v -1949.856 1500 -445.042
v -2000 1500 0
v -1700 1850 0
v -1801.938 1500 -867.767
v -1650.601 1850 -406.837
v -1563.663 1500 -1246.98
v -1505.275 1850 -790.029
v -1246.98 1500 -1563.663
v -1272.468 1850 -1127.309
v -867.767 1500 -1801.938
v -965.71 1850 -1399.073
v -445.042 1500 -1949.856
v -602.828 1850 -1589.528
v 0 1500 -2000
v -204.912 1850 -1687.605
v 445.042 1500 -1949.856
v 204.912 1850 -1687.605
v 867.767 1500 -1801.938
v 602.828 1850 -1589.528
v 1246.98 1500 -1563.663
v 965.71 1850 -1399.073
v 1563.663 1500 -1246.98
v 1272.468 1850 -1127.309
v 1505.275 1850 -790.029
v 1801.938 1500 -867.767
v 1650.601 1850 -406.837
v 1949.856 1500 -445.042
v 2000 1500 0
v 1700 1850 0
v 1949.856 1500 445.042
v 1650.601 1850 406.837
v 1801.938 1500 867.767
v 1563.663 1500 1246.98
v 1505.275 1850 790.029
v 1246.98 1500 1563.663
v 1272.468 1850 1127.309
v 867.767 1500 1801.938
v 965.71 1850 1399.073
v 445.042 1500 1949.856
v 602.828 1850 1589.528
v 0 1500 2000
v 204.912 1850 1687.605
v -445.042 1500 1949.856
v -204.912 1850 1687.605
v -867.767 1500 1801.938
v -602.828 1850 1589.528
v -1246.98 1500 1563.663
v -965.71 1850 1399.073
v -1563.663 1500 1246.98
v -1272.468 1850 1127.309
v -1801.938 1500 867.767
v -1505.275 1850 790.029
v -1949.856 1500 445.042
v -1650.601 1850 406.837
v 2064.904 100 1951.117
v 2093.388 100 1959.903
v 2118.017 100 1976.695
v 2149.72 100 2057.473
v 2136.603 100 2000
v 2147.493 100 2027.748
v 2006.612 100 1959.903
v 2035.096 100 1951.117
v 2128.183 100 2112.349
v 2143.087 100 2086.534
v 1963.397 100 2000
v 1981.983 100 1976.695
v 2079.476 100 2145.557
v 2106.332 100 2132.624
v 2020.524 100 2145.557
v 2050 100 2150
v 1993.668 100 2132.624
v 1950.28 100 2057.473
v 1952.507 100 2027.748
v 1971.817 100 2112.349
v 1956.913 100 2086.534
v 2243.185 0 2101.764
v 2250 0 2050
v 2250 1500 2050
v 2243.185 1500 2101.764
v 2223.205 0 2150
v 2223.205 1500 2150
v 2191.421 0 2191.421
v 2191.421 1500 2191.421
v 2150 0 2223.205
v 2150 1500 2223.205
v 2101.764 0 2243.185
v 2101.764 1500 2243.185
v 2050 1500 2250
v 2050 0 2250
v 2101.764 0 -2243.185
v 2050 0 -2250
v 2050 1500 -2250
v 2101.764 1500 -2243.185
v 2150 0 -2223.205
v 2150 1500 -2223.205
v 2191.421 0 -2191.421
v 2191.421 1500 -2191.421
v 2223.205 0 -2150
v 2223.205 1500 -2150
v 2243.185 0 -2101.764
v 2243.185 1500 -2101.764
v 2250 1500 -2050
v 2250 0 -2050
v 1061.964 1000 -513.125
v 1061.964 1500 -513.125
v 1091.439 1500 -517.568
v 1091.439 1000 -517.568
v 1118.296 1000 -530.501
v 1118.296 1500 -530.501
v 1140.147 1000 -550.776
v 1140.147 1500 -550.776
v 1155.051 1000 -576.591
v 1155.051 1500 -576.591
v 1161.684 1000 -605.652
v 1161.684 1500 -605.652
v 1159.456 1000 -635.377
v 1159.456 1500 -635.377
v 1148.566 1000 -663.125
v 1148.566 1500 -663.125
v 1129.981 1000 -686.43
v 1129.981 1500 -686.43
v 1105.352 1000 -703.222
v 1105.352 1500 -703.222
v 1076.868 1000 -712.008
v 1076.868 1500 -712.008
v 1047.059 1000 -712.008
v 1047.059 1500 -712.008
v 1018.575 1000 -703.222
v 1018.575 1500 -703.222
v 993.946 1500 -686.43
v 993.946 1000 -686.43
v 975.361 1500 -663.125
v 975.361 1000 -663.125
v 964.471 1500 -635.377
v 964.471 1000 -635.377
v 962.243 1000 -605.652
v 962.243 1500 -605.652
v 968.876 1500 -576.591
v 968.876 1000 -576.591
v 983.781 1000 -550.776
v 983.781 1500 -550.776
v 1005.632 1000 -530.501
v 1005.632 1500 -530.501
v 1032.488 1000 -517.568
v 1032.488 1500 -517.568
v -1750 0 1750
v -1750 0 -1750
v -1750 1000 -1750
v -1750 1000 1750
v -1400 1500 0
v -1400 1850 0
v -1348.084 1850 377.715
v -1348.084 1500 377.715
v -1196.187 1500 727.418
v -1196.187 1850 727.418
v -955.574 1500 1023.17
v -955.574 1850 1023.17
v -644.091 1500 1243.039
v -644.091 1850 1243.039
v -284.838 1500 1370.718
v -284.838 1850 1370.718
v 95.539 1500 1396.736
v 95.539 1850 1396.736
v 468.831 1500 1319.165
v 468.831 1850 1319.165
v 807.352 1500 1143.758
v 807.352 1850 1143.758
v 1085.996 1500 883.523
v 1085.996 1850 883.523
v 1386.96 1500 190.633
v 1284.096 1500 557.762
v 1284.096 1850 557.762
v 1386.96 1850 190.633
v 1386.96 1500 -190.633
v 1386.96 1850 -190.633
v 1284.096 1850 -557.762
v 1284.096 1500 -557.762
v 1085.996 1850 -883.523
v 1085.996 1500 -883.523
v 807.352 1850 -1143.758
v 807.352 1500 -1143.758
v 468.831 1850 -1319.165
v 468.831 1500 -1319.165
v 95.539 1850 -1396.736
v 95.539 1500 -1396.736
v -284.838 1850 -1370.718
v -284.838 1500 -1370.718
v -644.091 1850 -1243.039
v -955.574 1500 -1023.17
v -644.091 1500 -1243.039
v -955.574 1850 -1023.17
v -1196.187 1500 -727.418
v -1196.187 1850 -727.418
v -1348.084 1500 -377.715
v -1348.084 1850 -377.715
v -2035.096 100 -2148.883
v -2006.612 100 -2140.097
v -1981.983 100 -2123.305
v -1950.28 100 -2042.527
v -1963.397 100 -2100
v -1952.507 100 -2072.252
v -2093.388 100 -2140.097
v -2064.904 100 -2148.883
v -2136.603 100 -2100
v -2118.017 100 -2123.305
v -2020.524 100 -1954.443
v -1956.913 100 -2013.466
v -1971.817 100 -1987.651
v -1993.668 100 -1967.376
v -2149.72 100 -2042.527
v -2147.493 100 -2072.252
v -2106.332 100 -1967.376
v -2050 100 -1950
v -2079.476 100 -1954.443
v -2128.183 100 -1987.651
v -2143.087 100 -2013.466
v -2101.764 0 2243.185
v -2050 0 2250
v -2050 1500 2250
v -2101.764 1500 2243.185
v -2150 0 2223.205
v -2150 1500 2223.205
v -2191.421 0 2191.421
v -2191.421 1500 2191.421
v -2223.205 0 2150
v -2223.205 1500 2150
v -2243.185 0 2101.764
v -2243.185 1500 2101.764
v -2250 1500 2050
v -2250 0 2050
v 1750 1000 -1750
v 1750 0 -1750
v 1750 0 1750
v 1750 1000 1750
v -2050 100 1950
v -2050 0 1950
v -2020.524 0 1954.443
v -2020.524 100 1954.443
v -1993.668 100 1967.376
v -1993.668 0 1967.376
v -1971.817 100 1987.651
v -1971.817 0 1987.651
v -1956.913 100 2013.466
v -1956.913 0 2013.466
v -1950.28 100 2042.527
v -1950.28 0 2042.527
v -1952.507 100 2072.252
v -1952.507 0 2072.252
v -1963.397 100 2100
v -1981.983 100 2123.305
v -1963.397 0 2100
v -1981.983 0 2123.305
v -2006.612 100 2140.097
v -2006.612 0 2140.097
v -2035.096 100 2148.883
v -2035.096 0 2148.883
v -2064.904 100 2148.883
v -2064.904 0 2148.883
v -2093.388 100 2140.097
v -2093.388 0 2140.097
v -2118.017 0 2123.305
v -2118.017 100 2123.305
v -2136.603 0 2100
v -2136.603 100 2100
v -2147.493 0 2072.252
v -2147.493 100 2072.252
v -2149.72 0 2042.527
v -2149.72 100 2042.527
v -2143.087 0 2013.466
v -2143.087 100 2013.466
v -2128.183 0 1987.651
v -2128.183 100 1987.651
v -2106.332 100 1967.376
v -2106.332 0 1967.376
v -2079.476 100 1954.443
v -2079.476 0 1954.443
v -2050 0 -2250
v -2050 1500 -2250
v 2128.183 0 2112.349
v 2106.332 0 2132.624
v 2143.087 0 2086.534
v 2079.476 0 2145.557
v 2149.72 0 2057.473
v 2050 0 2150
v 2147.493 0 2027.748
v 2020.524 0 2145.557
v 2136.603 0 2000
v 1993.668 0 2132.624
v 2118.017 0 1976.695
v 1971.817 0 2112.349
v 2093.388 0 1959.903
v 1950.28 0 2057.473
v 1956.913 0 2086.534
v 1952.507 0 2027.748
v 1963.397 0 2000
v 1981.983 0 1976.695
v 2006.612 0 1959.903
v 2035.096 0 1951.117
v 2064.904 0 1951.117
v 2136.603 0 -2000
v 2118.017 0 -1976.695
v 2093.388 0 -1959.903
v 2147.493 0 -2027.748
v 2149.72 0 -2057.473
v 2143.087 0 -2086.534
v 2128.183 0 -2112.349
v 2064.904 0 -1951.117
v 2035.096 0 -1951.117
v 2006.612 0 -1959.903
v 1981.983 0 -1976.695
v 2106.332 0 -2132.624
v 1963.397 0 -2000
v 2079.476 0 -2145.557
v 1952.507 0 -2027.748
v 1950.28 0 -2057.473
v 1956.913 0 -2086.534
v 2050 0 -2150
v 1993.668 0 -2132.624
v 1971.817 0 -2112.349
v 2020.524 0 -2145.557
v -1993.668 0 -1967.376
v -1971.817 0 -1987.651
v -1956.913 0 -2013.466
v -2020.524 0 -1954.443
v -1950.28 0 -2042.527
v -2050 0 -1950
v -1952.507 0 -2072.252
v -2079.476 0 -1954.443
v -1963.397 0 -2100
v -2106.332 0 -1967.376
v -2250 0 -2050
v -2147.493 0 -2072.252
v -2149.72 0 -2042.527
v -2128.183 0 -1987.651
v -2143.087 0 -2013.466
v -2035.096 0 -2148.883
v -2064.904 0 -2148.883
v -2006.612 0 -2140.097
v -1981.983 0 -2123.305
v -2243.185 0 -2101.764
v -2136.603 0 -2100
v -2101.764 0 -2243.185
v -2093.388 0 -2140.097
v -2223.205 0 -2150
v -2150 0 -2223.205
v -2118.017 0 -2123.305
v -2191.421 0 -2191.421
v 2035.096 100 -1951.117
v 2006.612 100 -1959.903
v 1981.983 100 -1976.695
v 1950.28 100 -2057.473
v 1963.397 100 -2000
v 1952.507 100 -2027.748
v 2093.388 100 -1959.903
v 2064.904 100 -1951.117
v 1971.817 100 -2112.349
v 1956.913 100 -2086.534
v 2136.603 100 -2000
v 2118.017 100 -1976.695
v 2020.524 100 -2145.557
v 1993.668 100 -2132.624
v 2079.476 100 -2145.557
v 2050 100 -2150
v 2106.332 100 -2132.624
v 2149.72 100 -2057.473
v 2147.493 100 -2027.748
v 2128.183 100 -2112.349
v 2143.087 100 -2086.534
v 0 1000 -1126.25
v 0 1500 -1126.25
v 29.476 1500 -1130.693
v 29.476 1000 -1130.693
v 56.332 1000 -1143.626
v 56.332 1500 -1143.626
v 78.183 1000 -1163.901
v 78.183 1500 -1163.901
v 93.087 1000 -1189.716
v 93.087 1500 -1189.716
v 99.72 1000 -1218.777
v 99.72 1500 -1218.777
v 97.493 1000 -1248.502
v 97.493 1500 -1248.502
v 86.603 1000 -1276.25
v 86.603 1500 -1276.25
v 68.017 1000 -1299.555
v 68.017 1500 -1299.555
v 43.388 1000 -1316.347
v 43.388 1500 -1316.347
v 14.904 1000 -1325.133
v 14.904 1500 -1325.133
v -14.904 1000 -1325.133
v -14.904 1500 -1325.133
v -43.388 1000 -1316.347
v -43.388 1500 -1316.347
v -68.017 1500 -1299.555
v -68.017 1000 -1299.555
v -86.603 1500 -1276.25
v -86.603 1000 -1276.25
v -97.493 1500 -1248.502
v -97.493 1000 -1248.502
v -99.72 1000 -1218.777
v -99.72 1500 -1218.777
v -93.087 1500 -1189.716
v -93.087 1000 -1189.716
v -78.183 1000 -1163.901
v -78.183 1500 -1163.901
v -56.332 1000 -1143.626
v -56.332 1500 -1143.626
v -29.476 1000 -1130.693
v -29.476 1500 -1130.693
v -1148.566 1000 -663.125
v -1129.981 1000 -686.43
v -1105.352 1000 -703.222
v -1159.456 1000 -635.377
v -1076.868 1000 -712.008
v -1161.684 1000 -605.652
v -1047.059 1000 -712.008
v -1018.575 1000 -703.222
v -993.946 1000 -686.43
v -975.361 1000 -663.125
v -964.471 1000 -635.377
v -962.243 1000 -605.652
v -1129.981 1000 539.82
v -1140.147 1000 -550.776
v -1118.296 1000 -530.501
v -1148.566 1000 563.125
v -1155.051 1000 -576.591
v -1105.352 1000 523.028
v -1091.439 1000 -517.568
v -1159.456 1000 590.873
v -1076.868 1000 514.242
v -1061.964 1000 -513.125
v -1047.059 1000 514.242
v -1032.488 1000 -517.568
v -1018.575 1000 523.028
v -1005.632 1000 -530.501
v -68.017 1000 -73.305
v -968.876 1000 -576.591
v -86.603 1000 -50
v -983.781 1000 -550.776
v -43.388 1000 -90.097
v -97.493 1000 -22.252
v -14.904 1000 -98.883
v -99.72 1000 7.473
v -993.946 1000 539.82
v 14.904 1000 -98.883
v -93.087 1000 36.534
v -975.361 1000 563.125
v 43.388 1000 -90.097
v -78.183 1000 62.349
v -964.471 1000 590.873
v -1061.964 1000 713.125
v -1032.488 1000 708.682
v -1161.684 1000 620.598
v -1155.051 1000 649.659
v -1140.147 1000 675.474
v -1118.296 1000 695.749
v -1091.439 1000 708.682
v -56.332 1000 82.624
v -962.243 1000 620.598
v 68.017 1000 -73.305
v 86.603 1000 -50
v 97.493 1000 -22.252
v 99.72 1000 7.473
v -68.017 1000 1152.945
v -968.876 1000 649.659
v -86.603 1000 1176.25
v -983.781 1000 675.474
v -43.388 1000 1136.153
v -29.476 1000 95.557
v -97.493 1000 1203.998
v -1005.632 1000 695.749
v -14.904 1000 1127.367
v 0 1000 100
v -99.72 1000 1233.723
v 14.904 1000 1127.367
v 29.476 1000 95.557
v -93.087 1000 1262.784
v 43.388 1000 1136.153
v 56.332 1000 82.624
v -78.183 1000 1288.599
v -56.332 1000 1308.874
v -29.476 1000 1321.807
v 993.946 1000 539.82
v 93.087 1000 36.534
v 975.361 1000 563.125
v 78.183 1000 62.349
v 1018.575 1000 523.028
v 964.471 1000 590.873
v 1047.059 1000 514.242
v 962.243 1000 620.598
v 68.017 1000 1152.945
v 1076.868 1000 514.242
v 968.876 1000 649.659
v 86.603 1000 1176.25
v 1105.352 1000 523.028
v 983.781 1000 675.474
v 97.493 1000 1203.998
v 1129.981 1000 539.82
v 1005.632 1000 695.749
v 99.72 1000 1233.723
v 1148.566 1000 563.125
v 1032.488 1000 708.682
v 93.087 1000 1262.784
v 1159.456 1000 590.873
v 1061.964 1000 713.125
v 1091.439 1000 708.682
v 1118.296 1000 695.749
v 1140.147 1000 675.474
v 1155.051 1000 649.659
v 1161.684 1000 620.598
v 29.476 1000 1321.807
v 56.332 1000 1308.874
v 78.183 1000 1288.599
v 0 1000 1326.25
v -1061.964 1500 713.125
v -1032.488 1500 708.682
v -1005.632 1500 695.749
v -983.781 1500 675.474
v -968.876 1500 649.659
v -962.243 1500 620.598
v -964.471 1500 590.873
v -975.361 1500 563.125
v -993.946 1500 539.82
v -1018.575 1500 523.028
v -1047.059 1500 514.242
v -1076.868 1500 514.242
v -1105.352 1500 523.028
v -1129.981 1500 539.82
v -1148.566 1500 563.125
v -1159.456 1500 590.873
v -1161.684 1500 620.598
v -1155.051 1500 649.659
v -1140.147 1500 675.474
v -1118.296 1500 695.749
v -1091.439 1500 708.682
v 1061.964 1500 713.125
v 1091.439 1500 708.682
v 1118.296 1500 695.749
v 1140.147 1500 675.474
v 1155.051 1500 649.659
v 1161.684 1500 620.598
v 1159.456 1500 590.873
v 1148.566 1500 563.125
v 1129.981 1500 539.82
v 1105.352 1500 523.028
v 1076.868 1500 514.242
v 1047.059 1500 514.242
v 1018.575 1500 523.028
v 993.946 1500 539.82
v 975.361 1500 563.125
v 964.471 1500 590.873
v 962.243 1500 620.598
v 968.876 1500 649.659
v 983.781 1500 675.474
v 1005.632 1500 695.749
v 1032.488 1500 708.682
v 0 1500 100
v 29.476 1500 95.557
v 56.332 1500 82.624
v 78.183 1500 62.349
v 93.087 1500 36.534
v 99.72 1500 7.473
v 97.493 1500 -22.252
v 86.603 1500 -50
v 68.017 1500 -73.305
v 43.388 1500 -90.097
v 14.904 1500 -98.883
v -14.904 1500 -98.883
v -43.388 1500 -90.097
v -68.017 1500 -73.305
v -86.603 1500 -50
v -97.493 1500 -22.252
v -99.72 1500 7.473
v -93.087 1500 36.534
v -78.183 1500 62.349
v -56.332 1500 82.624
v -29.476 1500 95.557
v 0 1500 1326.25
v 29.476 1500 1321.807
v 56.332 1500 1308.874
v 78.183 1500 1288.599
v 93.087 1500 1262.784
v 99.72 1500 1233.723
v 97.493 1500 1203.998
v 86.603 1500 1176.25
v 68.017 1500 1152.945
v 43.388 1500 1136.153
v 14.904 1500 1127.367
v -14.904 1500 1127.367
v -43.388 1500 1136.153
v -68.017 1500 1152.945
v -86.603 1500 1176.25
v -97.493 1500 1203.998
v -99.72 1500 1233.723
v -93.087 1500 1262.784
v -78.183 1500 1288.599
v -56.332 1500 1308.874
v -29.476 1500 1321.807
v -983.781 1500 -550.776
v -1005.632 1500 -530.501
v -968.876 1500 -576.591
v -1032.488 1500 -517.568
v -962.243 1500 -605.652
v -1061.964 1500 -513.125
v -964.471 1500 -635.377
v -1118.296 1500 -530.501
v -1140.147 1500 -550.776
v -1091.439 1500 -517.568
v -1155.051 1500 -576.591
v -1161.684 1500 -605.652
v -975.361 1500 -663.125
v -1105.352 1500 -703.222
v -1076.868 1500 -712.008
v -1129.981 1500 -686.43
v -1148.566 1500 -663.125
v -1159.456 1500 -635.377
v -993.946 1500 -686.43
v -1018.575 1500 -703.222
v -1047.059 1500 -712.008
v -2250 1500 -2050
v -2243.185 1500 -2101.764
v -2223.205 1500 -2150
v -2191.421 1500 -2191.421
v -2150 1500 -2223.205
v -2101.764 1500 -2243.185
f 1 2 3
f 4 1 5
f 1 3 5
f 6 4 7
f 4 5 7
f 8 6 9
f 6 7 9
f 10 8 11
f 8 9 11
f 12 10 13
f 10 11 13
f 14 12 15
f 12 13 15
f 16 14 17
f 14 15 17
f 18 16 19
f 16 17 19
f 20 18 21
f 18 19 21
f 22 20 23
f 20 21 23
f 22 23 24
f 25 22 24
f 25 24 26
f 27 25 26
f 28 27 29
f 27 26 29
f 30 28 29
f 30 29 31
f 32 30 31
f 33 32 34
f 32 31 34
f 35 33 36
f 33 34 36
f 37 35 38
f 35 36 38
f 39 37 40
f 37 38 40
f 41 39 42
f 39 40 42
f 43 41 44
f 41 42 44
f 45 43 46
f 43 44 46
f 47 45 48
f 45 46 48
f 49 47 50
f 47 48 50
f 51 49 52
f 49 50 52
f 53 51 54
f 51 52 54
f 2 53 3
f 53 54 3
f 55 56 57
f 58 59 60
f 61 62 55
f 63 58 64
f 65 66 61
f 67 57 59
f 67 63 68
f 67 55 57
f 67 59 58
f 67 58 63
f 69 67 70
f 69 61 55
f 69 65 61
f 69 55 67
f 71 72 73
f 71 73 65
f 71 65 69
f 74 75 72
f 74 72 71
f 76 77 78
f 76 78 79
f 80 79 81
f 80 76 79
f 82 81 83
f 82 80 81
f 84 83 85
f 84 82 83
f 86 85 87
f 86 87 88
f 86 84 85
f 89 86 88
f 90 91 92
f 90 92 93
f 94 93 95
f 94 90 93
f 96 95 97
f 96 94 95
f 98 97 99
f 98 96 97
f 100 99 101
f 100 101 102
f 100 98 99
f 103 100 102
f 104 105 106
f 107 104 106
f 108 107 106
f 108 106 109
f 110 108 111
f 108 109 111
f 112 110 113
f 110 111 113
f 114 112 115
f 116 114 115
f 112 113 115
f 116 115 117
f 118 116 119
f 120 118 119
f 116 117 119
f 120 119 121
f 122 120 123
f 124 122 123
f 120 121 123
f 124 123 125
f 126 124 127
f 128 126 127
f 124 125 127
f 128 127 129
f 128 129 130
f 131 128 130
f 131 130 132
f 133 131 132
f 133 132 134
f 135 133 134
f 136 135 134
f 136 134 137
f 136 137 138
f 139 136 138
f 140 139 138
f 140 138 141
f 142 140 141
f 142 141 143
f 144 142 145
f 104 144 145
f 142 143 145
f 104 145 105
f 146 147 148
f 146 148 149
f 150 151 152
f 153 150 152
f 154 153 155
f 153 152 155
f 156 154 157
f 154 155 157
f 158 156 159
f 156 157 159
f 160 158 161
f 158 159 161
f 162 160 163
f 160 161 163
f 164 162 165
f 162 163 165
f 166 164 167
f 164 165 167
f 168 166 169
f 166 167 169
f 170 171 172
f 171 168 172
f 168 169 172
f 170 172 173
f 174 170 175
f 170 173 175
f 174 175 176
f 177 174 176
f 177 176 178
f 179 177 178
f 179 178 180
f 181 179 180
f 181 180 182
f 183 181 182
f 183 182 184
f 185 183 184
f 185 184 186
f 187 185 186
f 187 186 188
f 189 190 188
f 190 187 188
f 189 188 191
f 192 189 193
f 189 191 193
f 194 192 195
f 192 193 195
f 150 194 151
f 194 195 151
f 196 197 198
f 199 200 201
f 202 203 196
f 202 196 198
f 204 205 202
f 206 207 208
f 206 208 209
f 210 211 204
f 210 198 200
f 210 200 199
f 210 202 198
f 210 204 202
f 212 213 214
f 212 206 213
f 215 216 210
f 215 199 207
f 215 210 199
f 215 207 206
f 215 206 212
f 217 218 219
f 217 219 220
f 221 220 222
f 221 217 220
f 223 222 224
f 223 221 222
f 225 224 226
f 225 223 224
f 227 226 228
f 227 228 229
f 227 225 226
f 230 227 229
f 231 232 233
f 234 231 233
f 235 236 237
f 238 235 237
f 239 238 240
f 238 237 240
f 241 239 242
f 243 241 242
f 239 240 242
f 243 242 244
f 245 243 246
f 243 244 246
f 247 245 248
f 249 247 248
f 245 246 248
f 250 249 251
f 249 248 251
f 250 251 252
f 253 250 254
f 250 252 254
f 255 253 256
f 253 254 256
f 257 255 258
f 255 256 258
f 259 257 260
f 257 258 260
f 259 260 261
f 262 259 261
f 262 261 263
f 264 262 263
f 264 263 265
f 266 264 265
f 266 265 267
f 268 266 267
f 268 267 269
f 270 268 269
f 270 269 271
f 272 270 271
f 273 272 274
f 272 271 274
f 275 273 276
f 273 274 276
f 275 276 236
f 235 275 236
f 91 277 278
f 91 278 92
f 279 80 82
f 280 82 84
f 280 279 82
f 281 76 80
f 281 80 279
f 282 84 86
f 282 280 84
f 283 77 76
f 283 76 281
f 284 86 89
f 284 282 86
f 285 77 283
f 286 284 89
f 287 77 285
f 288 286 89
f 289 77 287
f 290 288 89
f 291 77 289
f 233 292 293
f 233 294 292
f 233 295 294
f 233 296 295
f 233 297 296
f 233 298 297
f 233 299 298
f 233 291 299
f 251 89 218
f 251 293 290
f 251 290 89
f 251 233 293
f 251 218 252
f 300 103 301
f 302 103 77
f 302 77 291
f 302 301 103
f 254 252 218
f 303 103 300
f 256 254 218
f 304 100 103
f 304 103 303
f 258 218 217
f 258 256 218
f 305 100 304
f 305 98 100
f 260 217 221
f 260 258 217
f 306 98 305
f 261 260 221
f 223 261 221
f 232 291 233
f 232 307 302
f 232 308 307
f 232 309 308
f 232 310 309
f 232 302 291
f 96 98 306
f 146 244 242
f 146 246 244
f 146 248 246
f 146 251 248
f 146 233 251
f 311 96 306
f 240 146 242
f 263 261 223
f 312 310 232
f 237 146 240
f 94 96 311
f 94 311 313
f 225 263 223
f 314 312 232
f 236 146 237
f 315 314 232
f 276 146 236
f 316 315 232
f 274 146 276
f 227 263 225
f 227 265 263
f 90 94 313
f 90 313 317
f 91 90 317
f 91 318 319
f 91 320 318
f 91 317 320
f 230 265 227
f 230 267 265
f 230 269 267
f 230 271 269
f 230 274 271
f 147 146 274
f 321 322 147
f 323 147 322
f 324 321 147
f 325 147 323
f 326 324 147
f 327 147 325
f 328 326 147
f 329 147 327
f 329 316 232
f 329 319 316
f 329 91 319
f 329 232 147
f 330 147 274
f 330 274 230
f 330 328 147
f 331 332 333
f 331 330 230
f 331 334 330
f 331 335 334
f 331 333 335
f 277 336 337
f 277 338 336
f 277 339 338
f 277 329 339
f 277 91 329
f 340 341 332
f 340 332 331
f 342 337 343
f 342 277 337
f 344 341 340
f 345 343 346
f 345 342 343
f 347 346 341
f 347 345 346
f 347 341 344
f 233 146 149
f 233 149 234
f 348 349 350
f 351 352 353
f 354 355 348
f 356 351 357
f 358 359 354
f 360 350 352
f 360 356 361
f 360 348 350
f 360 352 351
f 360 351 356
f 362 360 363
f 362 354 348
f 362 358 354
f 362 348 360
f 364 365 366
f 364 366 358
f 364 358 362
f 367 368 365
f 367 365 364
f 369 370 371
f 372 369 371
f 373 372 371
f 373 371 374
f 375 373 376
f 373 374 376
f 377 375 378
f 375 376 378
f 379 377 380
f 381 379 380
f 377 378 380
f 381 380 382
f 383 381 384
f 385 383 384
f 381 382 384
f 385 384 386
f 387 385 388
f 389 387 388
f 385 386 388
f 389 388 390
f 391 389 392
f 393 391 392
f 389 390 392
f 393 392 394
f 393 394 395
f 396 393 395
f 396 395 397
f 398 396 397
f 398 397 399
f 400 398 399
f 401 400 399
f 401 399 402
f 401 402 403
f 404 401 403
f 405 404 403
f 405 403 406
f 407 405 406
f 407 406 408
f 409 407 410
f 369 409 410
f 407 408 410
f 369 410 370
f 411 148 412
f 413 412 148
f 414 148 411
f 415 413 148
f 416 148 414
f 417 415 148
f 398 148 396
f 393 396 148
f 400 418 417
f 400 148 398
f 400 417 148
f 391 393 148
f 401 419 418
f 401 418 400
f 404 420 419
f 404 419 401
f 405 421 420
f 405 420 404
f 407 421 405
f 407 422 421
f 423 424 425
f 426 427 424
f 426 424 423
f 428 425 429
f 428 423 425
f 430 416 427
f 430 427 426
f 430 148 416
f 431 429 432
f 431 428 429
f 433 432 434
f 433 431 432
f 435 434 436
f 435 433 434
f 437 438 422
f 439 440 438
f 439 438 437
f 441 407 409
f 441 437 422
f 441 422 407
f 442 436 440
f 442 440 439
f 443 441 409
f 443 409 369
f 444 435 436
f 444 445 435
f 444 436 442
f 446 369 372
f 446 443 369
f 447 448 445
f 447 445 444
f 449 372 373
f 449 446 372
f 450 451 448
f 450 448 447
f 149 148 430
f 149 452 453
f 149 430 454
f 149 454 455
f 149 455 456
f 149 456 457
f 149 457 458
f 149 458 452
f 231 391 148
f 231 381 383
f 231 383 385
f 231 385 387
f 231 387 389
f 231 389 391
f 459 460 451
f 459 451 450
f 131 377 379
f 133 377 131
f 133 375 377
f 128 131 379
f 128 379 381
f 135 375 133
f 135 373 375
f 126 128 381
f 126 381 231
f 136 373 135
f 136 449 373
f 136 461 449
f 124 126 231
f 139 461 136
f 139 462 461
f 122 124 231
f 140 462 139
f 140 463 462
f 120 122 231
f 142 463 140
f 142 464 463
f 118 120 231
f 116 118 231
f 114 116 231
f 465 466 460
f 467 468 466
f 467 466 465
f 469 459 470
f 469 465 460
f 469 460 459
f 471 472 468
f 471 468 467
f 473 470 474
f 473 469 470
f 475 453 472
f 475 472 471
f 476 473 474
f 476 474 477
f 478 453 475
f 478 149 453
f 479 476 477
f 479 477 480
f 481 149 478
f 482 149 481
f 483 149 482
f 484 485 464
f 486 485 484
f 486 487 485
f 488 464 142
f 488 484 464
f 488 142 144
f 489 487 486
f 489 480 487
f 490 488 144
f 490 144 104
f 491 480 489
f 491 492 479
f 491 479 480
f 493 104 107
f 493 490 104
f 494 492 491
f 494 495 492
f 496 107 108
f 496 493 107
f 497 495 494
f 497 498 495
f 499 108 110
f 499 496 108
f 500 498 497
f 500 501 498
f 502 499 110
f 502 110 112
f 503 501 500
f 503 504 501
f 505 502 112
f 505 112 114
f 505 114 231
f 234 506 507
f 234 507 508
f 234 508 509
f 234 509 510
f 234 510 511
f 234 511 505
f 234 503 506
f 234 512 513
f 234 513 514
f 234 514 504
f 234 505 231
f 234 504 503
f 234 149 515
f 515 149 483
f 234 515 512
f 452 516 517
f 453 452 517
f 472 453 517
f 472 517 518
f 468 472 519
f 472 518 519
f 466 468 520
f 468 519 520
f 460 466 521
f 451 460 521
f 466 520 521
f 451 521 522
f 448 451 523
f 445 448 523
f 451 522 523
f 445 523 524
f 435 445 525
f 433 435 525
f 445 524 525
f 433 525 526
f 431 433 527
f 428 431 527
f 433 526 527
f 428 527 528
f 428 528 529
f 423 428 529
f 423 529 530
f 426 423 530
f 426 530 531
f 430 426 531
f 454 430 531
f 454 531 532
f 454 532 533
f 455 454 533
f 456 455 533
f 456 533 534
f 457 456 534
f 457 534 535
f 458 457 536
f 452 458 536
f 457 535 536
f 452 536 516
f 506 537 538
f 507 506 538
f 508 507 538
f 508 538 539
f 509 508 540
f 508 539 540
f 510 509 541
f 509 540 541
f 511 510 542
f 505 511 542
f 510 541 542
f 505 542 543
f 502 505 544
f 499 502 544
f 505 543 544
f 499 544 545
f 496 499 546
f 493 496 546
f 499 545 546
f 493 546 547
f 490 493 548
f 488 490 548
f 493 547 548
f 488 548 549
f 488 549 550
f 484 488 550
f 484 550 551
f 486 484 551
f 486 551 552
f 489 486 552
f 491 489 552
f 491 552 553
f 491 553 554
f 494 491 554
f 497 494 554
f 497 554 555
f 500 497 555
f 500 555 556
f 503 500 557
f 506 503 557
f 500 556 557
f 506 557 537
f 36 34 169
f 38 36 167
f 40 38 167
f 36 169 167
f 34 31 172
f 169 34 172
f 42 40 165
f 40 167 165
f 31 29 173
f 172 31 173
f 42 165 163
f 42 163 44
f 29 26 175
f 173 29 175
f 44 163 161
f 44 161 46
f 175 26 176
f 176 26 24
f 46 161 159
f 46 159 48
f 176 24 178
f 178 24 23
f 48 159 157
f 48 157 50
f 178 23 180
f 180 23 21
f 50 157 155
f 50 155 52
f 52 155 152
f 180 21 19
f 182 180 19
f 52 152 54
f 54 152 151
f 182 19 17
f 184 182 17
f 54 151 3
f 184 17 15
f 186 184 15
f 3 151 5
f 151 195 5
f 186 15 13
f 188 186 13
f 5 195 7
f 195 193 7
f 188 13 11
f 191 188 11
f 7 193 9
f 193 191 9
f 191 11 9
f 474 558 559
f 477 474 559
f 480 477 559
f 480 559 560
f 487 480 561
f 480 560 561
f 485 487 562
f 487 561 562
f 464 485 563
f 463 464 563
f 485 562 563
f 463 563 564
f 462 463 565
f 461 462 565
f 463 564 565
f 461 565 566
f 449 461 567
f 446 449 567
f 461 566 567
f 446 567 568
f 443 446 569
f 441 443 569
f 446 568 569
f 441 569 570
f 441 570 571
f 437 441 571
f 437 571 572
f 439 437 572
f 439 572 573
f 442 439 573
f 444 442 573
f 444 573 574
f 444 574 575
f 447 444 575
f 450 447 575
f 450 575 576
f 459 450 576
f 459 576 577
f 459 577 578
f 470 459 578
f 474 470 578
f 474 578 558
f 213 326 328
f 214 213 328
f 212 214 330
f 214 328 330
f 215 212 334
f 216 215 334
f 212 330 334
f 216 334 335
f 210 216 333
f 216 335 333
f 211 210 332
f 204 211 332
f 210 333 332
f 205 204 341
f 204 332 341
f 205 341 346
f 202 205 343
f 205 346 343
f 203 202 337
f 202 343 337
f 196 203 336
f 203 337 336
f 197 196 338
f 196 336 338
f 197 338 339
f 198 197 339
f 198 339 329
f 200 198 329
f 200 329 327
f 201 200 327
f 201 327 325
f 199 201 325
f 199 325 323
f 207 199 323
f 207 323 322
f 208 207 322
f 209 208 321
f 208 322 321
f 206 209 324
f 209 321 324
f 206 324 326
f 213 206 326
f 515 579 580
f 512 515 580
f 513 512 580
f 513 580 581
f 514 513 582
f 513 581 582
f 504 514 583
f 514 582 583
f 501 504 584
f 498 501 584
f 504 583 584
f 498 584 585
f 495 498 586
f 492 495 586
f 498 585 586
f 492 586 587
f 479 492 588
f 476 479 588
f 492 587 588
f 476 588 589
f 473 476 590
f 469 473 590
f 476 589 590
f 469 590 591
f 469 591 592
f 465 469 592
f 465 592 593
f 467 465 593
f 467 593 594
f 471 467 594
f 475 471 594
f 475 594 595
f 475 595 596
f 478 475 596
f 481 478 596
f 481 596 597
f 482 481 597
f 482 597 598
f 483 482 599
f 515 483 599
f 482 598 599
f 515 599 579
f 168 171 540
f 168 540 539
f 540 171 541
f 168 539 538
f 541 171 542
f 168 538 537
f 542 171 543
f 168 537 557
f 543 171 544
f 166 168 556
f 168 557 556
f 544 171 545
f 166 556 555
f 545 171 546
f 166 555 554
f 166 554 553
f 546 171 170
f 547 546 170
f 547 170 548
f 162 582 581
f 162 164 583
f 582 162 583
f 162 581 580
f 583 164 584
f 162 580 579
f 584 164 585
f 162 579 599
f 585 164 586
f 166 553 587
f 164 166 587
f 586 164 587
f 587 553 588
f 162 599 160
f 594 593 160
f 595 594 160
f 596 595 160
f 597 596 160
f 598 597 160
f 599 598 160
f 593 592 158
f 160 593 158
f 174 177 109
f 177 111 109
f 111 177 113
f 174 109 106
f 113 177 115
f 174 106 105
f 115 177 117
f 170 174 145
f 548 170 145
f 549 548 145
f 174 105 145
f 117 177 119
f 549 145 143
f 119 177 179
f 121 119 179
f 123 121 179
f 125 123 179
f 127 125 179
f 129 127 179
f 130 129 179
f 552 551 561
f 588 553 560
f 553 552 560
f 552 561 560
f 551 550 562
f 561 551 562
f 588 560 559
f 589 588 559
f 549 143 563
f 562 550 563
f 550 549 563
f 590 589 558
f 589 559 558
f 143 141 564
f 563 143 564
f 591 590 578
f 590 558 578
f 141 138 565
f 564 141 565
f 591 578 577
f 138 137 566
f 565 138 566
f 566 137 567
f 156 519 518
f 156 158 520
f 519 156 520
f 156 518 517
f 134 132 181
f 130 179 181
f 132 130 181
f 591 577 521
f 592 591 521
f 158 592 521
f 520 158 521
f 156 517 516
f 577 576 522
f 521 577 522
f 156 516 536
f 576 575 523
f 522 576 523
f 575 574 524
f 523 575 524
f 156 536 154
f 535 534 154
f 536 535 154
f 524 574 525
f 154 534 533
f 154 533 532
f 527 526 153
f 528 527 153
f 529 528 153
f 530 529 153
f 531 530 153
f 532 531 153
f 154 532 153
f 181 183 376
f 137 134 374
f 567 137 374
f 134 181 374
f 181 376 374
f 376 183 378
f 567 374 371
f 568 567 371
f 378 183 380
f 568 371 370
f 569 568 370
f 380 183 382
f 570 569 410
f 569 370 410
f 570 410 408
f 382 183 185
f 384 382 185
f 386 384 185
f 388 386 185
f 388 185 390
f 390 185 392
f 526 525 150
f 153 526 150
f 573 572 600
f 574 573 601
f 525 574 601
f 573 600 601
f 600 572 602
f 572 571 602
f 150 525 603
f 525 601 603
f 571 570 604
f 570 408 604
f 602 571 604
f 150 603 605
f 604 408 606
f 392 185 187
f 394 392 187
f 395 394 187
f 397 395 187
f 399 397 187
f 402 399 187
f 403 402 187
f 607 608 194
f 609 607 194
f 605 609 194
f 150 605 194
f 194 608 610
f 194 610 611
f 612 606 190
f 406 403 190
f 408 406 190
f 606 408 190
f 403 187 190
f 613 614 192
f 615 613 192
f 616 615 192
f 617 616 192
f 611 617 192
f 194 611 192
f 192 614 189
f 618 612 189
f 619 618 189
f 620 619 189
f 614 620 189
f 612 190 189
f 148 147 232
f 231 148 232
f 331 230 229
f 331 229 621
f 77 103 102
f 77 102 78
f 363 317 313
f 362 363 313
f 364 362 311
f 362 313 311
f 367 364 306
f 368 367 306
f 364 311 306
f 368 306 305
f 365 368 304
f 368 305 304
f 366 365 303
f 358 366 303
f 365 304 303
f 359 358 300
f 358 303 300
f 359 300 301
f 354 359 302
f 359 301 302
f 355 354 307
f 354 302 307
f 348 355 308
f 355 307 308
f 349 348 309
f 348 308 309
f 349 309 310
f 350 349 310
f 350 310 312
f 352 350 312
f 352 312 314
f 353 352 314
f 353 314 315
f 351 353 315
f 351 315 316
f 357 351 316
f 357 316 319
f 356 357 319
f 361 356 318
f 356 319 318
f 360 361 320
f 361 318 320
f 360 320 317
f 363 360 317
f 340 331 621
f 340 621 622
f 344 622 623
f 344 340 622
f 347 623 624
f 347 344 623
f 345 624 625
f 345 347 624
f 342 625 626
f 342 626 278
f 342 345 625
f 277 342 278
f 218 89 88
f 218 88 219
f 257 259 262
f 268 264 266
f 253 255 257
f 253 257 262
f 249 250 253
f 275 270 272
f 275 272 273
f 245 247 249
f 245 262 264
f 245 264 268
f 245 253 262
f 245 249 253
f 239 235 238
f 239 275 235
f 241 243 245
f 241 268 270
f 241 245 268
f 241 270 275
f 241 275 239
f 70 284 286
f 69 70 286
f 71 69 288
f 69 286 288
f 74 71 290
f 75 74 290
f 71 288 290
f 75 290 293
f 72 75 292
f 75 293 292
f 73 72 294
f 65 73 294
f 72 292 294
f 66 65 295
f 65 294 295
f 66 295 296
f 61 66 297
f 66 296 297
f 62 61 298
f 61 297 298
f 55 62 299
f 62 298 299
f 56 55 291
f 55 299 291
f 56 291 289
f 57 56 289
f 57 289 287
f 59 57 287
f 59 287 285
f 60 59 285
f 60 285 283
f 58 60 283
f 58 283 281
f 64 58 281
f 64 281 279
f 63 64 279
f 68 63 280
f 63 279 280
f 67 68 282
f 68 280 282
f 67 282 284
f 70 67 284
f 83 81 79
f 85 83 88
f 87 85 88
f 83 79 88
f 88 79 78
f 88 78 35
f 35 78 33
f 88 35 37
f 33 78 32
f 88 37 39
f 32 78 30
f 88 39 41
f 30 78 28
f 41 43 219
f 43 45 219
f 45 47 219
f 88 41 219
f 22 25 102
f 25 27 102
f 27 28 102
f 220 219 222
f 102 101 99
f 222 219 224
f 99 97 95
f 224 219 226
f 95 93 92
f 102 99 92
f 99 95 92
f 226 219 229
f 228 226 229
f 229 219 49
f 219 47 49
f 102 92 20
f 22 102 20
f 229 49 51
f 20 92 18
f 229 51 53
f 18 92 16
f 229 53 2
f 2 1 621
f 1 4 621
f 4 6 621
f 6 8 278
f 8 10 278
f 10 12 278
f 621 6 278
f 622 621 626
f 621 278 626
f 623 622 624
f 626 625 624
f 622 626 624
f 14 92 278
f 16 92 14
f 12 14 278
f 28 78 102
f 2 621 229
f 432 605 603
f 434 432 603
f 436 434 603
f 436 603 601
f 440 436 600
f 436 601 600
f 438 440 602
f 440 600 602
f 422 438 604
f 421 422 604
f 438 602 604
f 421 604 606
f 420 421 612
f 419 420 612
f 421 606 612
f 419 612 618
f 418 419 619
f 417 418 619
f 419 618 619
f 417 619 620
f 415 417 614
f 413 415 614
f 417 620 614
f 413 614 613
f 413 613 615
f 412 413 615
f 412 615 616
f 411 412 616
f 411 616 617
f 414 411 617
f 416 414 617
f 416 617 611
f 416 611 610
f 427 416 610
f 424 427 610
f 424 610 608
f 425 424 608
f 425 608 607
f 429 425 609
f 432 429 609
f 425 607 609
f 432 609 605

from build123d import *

# Parameters (mm, degrees)
BASE_DEPTH                      = 1500
EXTERNAL_SUPPORT_R              = 1400
TOWER_SUPPORT_DEPTH             = 3681.692869556
TOWER_START                     = -1500
BASE_MEETING_R                  = 1400
TOWER_BASE_METTING_POINT_DEPTH  = 1500
M20_MOUNTING_POINTS_R           = 100
TOWER_MOUNING_POINTS_DEPTH      = 500
GEAR_BOX_SHAFT_CONNECTION_R     = 100
GEAR_BOX_CONNECTING_POINT_DEPTH = 1000
SKETCH1_W                       = 3500
SKETCH1_H                       = 3500
BASE_PLATE_DEPTH                = 1000
SKETCH2_R                       = 10
SKETCH2_R_2                     = 100
CUT_EXTRUDE2_DEPTH              = 100


with BuildPart() as part:
    # Turbine Base → Base (new body)
    with BuildSketch(Plane(origin=(0, 0, 0), x_dir=(1, 0, 0), z_dir=(0, 1, 0))):
        with BuildLine():
            Line((-2050, 2250), (2050, 2250))
            ThreePointArc((2050, 2250), (2191.421356237, 2191.421356237), (2250, 2050))
            Line((2250, 2050), (2250, -2050))
            ThreePointArc((2250, -2050), (2191.421356237, -2191.421356237), (2050, -2250))
            Line((2050, -2250), (-2050, -2250))
            ThreePointArc((-2050, -2250), (-2191.421356237, -2191.421356237), (-2250, -2050))
            Line((-2250, -2050), (-2250, 2050))
            ThreePointArc((-2250, 2050), (-2191.421356237, 2191.421356237), (-2050, 2250))
        make_face()
    extrude(amount=BASE_DEPTH)

    # Support → Tower Support projection (revolve)
    with BuildSketch(Plane.XY, mode=Mode.PRIVATE) as tower_support_projection_sk:
        Polygon((0, 1850), (0, 1500), (2000, 1500), (1700, 1850), align=None)
    revolve(tower_support_projection_sk.sketch.rotate(Axis((0, 1850, 0), (0, -1, 0)), 180), axis=Axis((0, 1850, 0), (0, -1, 0)))

    # external support → Tower Support (cut, through all)
    with BuildSketch(Plane(origin=(0, 1850, 0), x_dir=(1, 0, 0), z_dir=(0, 1, 0))):
        with Locations(Location((0, 0, 0), (0, 0, 180))):
            Circle(EXTERNAL_SUPPORT_R)
    extrude(amount=-TOWER_SUPPORT_DEPTH, mode=Mode.SUBTRACT)

    # Base meeting → Tower Base metting point (add)
    with BuildSketch(Plane.XZ.offset(TOWER_START)):
        with Locations(Location((0, 0, 0), (0, 0, 180))):
            Circle(BASE_MEETING_R)
    extrude(amount=TOWER_BASE_METTING_POINT_DEPTH)

    # M20 mounting points → Tower Mouning points (cut)
    with BuildSketch(Plane(origin=(0, 1500, 0), x_dir=(1, 0, 0), z_dir=(0, 1, 0))):
        with Locations(Location((0, 1226.25, 0), (0, 0, 270))):
            Circle(M20_MOUNTING_POINTS_R)
        with Locations(Location((1061.963651391, 613.125, 0), (0, 0, 270))):
            Circle(M20_MOUNTING_POINTS_R)
        with Locations(Location((1061.963651391, -613.125, 0), (0, 0, 270))):
            Circle(M20_MOUNTING_POINTS_R)
        with Locations(Location((0, -1226.25, 0), (0, 0, 270))):
            Circle(M20_MOUNTING_POINTS_R)
        with Locations(Location((-1061.963651391, -613.125, 0), (0, 0, 270))):
            Circle(M20_MOUNTING_POINTS_R)
        with Locations(Location((-1061.963651391, 613.125, 0), (0, 0, 270))):
            Circle(M20_MOUNTING_POINTS_R)
    extrude(amount=-TOWER_MOUNING_POINTS_DEPTH, mode=Mode.SUBTRACT)

    # Gear box shaft connection → Gear box connecting point (cut)
    with BuildSketch(Plane(origin=(0, 1500, 0), x_dir=(1, 0, 0), z_dir=(0, 1, 0))):
        with Locations(Location((0, 0, 0), (0, 0, 270))):
            Circle(GEAR_BOX_SHAFT_CONNECTION_R)
    extrude(amount=-GEAR_BOX_CONNECTING_POINT_DEPTH, mode=Mode.SUBTRACT)

    # Sketch1 → Base plate (cut)
    with BuildSketch(Plane.XZ):
        Rectangle(SKETCH1_W, SKETCH1_H)
    extrude(amount=-BASE_PLATE_DEPTH, mode=Mode.SUBTRACT)

    # Sketch2 → Cut-Extrude2 (cut)
    with BuildSketch(Plane.XZ):
        with Locations((2230, -2230)):
            Circle(SKETCH2_R)
        with Locations((2230, 2230)):
            Circle(SKETCH2_R)
        with Locations(Location((-2050, 2050, 0), (0, 0, 270))):
            Circle(SKETCH2_R_2)
        with Locations(Location((-2050, -2050, 0), (0, 0, 90))):
            Circle(SKETCH2_R_2)
        with Locations(Location((2050, -2050, 0), (0, 0, 270))):
            Circle(SKETCH2_R_2)
        with Locations(Location((2050, 2050, 0), (0, 0, 90))):
            Circle(SKETCH2_R_2)
    extrude(amount=-CUT_EXTRUDE2_DEPTH, mode=Mode.SUBTRACT)


solid = part.part
